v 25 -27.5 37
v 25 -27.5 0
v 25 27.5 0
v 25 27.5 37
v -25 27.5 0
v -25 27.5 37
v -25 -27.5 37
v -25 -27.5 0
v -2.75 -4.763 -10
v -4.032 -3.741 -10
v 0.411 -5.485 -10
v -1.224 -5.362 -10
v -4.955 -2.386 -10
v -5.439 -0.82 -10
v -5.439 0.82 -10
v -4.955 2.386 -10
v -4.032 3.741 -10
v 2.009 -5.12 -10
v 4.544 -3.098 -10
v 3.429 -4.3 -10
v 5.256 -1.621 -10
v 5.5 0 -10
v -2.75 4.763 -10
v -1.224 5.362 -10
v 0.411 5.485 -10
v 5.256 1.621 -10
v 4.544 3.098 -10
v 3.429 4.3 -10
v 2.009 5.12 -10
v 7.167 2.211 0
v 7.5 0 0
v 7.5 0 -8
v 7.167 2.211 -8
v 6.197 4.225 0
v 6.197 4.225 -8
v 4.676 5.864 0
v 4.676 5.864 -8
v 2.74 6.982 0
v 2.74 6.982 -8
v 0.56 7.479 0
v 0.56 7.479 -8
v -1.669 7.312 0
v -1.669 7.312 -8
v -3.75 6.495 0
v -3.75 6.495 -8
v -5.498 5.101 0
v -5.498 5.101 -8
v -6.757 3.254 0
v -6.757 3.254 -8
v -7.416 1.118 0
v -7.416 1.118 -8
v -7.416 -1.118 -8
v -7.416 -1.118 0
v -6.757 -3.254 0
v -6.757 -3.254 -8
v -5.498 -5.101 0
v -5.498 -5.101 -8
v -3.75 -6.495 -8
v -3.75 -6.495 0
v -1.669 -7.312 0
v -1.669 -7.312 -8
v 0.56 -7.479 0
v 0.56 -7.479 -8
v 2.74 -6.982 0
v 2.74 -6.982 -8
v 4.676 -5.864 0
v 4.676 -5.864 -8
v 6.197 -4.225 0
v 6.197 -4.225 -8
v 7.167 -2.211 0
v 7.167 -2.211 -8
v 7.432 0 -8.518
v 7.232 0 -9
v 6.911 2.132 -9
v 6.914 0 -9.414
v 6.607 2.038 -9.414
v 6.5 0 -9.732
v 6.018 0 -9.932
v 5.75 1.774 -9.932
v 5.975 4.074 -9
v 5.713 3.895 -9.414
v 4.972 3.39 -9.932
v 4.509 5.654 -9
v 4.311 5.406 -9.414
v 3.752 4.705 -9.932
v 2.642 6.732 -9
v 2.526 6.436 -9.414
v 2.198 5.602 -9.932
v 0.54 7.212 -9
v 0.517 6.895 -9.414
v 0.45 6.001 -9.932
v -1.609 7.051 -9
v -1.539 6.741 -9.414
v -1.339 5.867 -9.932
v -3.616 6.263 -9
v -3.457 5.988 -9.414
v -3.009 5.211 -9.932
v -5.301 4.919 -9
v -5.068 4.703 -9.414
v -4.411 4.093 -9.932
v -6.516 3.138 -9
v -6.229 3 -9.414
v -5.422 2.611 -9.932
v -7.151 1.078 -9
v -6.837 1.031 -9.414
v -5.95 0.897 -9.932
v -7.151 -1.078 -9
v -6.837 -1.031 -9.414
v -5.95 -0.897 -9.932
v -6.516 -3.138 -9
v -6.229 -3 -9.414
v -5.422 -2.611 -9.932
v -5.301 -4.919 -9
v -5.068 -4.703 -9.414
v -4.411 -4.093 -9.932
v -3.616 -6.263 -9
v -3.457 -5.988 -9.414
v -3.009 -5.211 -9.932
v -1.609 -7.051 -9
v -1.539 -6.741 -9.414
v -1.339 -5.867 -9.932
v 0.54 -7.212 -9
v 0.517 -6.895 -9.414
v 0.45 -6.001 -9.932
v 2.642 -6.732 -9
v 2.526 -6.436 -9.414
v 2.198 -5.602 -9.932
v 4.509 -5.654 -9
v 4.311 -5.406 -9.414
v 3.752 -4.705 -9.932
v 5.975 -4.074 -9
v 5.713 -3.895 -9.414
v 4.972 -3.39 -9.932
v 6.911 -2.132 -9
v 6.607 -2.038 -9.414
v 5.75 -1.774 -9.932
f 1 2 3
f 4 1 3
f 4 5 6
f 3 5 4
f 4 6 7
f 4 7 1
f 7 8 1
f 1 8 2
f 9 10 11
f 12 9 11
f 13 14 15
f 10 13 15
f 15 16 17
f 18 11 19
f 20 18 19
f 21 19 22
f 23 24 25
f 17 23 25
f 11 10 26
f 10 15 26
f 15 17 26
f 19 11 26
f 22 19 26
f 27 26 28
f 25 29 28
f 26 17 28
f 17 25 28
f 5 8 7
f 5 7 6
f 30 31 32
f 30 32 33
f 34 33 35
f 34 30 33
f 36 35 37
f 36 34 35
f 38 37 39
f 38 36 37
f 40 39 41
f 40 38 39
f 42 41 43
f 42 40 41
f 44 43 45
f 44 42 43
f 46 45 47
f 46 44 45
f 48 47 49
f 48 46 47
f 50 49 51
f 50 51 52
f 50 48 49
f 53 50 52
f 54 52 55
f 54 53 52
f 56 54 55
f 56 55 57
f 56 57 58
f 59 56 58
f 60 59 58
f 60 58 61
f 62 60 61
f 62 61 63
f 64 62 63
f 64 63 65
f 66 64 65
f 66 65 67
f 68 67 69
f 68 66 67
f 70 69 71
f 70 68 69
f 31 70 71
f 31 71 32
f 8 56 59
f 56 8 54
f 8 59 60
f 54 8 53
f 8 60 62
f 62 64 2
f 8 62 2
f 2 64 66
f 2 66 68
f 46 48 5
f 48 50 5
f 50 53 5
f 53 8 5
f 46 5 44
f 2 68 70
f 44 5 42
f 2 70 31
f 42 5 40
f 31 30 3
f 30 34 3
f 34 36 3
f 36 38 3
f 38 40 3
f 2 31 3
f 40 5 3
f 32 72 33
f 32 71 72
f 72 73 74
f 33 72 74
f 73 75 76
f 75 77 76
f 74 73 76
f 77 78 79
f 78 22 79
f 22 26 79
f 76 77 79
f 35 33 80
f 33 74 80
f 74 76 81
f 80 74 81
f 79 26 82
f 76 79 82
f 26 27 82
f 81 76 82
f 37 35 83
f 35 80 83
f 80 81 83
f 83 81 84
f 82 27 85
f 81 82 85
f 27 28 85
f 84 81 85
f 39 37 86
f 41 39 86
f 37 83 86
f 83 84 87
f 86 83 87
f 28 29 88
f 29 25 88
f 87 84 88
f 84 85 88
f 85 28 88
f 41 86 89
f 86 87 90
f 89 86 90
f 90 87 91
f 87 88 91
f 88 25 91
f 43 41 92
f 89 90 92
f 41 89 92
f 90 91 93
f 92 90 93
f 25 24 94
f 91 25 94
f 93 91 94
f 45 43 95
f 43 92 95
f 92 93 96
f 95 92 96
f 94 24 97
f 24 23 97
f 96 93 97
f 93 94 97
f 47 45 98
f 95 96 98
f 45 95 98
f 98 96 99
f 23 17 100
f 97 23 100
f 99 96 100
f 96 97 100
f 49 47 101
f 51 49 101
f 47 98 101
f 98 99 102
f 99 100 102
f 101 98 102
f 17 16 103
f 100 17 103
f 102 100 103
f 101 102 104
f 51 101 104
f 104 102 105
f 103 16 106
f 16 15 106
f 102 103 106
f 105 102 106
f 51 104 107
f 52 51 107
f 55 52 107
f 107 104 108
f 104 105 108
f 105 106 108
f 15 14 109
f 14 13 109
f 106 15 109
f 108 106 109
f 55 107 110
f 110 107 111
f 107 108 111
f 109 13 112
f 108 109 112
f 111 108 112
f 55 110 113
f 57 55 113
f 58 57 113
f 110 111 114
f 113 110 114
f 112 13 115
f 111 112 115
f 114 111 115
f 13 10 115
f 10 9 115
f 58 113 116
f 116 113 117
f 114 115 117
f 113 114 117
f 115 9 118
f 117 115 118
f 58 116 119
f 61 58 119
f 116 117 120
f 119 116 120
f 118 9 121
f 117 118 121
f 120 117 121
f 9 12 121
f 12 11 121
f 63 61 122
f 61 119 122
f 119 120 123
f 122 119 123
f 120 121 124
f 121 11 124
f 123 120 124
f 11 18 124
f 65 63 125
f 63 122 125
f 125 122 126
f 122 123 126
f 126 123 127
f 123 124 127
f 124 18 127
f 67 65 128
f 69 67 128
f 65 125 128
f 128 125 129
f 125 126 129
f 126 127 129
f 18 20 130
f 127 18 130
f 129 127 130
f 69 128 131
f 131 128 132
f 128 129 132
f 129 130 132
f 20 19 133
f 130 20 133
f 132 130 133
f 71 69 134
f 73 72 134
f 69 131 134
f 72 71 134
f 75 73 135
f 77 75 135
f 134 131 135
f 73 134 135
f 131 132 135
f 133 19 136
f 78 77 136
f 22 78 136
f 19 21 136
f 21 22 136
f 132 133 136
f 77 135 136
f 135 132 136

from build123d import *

# Parameters (mm, degrees)
ESQUISSE1_W        = 50
ESQUISSE1_H        = 55
BOSS_EXTRU_1_DEPTH = 37
ESQUISSE2_R        = 7.5
BOSS_EXTRU_2_DEPTH = 10
CONG_3_R           = 2


with BuildPart() as part:
    # Esquisse1 → Boss.-Extru.1 (new body)
    with BuildSketch(Plane.XY):
        Rectangle(ESQUISSE1_W, ESQUISSE1_H)
    extrude(amount=BOSS_EXTRU_1_DEPTH)

    # Esquisse2 → Boss.-Extru.2 (add)
    with BuildSketch(Plane.XY):
        Circle(ESQUISSE2_R)
    extrude(amount=-BOSS_EXTRU_2_DEPTH)

    # Congé3
    cong_3_edges = [part.edges().sort_by_distance(p)[0] for p in [
        (-7.5, 0, -10),
    ]]
    fillet(cong_3_edges, radius=CONG_3_R)


solid = part.part
